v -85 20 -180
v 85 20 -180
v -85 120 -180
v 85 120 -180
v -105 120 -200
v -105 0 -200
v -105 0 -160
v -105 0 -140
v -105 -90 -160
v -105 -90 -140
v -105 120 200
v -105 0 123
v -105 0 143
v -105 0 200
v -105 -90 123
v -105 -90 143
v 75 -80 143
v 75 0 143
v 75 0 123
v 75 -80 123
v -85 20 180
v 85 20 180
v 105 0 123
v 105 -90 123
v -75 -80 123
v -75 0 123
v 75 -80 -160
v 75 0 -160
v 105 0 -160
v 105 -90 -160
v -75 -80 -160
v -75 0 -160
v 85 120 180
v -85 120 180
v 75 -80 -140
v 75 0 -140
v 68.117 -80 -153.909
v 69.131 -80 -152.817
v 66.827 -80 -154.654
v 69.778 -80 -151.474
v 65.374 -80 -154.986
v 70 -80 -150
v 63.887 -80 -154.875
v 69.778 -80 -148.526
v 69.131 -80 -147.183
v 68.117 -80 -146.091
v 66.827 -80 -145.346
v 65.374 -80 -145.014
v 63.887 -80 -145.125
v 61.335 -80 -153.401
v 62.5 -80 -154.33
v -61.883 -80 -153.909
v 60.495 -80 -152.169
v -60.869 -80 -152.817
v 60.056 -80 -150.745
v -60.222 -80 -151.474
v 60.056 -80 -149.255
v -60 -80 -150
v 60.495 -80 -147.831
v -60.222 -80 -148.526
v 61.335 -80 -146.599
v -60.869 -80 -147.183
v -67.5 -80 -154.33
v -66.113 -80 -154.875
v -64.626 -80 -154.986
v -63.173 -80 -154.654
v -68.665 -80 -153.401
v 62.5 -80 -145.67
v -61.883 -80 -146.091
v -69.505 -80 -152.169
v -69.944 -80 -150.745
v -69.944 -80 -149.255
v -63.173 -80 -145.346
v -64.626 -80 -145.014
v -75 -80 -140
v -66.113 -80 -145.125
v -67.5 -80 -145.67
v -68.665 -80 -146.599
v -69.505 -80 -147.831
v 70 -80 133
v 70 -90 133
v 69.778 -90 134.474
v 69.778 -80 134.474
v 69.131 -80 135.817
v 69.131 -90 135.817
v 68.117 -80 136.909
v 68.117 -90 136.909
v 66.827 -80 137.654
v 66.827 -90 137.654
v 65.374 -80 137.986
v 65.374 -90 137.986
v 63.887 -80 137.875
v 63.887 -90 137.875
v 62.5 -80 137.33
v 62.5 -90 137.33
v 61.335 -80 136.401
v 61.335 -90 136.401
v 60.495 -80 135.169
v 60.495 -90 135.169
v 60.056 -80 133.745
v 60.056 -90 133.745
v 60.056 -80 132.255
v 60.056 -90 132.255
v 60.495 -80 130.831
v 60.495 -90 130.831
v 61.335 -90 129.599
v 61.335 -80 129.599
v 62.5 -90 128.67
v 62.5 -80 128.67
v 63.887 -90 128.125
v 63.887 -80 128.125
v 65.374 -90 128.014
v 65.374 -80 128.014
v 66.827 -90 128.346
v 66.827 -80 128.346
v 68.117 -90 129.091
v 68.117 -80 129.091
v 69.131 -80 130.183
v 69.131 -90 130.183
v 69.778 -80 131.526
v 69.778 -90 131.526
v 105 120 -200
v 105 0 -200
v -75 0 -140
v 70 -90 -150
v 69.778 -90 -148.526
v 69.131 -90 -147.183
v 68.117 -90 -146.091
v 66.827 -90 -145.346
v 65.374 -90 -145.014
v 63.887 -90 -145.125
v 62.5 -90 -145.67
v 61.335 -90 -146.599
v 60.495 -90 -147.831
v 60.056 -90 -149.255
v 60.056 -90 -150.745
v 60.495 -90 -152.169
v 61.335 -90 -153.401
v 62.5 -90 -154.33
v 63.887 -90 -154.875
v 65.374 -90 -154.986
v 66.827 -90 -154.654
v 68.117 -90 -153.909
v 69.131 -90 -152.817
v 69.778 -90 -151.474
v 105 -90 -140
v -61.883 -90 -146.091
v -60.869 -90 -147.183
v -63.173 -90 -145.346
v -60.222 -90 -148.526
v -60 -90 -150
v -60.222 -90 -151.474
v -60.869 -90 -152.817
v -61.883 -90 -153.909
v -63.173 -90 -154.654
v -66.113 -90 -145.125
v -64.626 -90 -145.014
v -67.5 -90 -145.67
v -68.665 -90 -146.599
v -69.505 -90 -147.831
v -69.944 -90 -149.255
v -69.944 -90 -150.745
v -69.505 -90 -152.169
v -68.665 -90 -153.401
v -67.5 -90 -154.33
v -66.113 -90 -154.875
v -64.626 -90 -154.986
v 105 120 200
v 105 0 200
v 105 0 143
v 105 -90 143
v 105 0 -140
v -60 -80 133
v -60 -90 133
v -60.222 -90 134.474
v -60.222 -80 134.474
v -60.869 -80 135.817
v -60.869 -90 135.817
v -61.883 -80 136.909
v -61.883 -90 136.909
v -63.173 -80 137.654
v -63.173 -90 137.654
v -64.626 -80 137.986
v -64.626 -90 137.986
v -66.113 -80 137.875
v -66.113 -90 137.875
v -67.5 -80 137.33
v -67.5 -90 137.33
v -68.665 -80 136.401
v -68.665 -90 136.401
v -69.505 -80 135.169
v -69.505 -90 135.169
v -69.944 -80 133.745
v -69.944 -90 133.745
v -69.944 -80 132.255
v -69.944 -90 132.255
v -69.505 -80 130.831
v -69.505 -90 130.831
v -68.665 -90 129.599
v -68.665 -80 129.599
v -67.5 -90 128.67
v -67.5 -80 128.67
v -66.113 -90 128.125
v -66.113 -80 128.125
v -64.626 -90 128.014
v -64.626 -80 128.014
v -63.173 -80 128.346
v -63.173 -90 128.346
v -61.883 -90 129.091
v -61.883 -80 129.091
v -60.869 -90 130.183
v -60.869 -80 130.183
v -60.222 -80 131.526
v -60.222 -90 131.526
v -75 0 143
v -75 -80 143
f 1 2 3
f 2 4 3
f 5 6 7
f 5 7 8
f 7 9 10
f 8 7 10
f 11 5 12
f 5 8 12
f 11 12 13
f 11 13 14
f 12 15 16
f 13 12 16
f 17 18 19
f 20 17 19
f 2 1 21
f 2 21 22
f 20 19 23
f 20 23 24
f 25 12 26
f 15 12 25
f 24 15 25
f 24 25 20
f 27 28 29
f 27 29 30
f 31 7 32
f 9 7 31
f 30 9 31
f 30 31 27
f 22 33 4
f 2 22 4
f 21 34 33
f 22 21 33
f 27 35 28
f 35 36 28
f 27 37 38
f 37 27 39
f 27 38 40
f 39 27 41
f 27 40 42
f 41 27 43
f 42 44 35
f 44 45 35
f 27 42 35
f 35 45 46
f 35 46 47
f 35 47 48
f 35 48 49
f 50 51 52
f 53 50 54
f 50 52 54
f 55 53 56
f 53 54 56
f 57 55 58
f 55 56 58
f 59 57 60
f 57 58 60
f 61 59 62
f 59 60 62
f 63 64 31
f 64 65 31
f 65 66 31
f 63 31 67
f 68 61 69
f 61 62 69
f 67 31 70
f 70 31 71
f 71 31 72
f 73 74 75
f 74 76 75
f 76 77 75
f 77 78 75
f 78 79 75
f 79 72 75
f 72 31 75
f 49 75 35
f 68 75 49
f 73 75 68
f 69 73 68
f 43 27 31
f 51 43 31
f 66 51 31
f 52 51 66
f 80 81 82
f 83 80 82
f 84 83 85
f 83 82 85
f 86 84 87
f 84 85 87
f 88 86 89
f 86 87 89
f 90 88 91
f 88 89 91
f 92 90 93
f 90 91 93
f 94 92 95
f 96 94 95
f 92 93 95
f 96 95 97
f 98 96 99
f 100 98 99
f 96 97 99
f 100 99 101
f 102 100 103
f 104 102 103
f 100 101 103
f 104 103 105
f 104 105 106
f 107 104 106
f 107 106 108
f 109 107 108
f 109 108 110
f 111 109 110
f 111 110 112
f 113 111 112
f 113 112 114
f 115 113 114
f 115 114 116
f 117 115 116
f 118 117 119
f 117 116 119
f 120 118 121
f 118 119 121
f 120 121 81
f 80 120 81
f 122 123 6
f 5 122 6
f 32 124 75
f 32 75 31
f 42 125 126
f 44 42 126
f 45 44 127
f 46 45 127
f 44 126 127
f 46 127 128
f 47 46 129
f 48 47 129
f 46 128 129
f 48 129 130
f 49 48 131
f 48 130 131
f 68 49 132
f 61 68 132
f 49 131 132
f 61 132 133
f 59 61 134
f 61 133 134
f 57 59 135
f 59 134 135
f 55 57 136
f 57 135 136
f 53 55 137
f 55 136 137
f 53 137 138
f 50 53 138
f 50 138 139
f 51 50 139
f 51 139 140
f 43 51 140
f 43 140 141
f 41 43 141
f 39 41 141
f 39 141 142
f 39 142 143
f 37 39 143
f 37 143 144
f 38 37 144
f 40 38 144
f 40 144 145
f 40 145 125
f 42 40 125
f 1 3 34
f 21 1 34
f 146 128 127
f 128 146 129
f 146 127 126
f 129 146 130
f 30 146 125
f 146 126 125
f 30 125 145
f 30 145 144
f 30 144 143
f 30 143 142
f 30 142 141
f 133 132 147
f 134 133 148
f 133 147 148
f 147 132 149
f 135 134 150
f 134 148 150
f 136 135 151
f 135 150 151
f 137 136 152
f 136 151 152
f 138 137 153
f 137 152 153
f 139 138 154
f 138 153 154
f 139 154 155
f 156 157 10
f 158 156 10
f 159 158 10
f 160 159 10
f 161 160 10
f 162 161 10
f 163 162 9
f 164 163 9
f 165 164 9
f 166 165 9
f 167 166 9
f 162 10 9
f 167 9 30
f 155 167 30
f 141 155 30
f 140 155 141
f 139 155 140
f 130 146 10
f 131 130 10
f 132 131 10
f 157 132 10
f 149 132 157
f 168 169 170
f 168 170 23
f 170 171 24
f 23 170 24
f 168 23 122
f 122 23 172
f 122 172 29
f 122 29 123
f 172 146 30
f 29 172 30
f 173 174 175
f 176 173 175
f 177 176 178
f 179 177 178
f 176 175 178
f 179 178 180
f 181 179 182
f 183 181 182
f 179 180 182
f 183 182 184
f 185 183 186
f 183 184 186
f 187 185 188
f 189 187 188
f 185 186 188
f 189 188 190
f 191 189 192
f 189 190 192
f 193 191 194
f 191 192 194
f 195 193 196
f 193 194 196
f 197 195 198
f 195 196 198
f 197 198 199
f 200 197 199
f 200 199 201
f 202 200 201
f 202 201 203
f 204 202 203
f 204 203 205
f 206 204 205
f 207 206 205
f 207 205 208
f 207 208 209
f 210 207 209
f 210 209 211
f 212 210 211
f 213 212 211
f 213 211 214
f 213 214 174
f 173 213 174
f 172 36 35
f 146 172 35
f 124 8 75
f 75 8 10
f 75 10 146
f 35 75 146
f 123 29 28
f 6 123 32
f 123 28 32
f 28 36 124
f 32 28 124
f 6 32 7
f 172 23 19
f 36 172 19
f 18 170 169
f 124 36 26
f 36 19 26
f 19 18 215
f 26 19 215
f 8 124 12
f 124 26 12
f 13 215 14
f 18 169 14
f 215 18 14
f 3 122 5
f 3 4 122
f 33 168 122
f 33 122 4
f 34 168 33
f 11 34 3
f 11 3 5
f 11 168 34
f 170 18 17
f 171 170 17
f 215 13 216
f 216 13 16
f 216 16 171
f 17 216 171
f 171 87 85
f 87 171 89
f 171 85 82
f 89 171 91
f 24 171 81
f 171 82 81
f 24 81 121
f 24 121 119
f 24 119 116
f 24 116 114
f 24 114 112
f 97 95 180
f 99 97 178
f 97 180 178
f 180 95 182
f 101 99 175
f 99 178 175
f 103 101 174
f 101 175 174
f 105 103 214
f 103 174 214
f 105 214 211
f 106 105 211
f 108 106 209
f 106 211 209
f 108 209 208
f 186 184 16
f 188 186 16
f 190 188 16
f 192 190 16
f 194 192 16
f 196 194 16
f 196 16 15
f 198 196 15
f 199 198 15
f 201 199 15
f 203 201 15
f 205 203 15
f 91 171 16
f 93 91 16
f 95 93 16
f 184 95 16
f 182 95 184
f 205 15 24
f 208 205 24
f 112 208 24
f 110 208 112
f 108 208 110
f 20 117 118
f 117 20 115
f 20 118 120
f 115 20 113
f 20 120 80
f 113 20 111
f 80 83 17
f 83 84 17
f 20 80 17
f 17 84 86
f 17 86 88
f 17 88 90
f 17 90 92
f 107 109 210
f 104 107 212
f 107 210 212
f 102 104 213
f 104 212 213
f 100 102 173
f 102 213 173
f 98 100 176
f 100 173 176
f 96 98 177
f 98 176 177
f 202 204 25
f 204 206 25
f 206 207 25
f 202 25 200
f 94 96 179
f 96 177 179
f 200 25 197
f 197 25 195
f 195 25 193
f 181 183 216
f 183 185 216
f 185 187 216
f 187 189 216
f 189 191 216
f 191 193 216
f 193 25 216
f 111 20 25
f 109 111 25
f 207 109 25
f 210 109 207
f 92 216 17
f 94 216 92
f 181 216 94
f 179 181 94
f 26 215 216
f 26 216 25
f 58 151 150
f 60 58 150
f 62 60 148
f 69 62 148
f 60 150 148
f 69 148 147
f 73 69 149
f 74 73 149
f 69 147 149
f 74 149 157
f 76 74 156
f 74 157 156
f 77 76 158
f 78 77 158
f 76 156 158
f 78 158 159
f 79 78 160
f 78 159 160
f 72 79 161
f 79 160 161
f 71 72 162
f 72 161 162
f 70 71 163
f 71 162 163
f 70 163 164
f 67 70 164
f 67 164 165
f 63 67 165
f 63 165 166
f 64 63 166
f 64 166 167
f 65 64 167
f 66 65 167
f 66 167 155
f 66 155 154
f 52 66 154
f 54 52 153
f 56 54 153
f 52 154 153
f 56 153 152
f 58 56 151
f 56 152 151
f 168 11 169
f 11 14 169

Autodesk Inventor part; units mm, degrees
ref_plane "YZ Plane" through (0, 0, 0) normal (1, 0, 0) x (0, 1, 0)
ref_plane "XZ Plane" through (0, 0, 0) normal (0, 1, 0) x (-1, 0, 0)
ref_plane "XY Plane" through (0, 0, 0) normal (0, 0, 1) x (1, 0, 0)
sketch "Boceto1" plane through (0, 0, 0) normal (0, 1, 0) x (-1, 0, 0)
  line L0 (105, 200) -> (-105, 200)
  line L1 (-105, 200) -> (-105, -200)
  line L2 (-105, -200) -> (105, -200)
  line L3 (105, -200) -> (105, 200)
  line L4 (105, 200) -> (-105, -200) construction
  line L5 (-105, 200) -> (105, -200) construction
  point P0 (0, 0)
  dimension "d0" = 210
  dimension "d1" = 400
extrude "Extrusión1" add sketch "Boceto1" along normal blind 120
sketch "Boceto2" plane through (0, 120, 0) normal (0, 1, 0) x (1, 0, 0)
  line L0 (-85, -180) -> (85, -180)
  line L1 (85, -180) -> (85, 180)
  line L2 (85, 180) -> (-85, 180)
  line L3 (-85, 180) -> (-85, -180)
  line L4 (-85, -180) -> (85, 180) construction
  line L5 (85, -180) -> (-85, 180) construction
  point P0 (0, 0)
  dimension "d4" = 170
  dimension "d5" = 360
extrude "Extrusión2" cut sketch "Boceto2" against normal blind 100
sketch "Boceto3" plane through (0, 0, 0) normal (0, -1, 0) x (1, 0, 0)
  line L0 (105, 143) -> (75, 143)
  line L1 (75, 143) -> (75, 123)
  line L2 (75, 123) -> (105, 123)
  line L3 (105, 123) -> (105, 143)
  line L4 (105, 143) -> (75, 123) construction
  line L5 (75, 143) -> (105, 123) construction
  line L6 (105, -140) -> (75, -140)
  line L7 (75, -140) -> (75, -160)
  line L8 (75, -160) -> (105, -160)
  line L9 (105, -160) -> (105, -140)
  line L10 (105, -140) -> (75, -160) construction
  line L11 (75, -140) -> (105, -160) construction
  line L12 (105, -200) -> (-105, -200) projected
  line L13 (-105, 143) -> (-75, 143)
  line L14 (-75, 143) -> (-75, 123)
  line L15 (-75, 123) -> (-105, 123)
  line L16 (-105, 123) -> (-105, 143)
  line L17 (-105, 143) -> (-75, 123) construction
  line L18 (-75, 143) -> (-105, 123) construction
  line L19 (-105, -140) -> (-75, -140)
  line L20 (-75, -140) -> (-75, -160)
  line L21 (-75, -160) -> (-105, -160)
  line L22 (-105, -160) -> (-105, -140)
  line L23 (-105, -140) -> (-75, -160) construction
  line L24 (-75, -140) -> (-105, -160) construction
  line L25 (-105, 200) -> (105, 200) projected
  point P0 (0, 0)
  point P1 (90, 133)
  point P2 (105, 133)
  point P3 (90, -150)
  point P4 (105, -150)
  point P5 (-90, 35)
  point P6 (-105, 35)
  point P7 (-90, -150)
  point P8 (-105, -150)
  point P9 (-90, 143)
  dimension "d9" = 20
  dimension "d12" = 20
  dimension "d34" = 57
  dimension "d35" = 57
  dimension "d36" = 20
  dimension "d37" = 40
  dimension "d38" = 40
extrude "Extrusión3" add sketch "Boceto3" along normal blind 90
sketch "Boceto6" plane through (-75, 0, 143) normal (1, 0, 0) x (0, 0, -1)
  line L0 (0, 0) -> (0, -90) projected
  line L1 (20, 0) -> (20, -90) projected
  line L2 (0, -90) -> (20, -90)
  line L3 (20, -90) -> (20, -80)
  line L4 (20, -80) -> (0, -80)
  line L5 (0, -80) -> (0, -90)
  point P0 (143, 0)
  dimension "d16" = 10
extrude "Extrusión4" add sketch "Boceto6" along normal blind 150
sketch "Boceto7" plane through (-75, 0, -140) normal (1, 0, 0) x (0, 0, -1)
  line L0 (0, 0) -> (0, -90) projected
  line L1 (20, 0) -> (20, -90) projected
  line L2 (0, -90) -> (20, -90)
  line L3 (20, -90) -> (20, -80)
  line L4 (20, -80) -> (0, -80)
  line L5 (0, -80) -> (0, -90)
  point P0 (-140, 0)
  dimension "d19" = 10
extrude "Extrusión5" add sketch "Boceto7" along normal blind 150
sketch "Boceto8" plane through (0, -90, 0) normal (0, -1, 0) x (1, 0, 0)
  circle A0 centre (-65, 133) radius 5
  circle A1 centre (65, 133) radius 5
  line L0 (-105, 143) -> (-105, 123) projected
  line L1 (105, 123) -> (105, 143) projected
  line L2 (60, 123) -> (60, 143)
  line L3 (105, 143) -> (-105, 143) projected
  point P0 (0, 0)
  dimension "d22" = 10
  dimension "d23" = 10
  dimension "d24" = 40
  dimension "d25" = 40
  dimension "d39" = 10
  dimension "d40" = 10
sketch "Boceto9" plane through (0, -90, 0) normal (0, -1, 0) x (1, 0, 0)
  circle A0 centre (-65, -150) radius 5
  circle A1 centre (65, -150) radius 5
  line L0 (-105, -140) -> (-105, -160) projected
  line L1 (105, -160) -> (105, -140) projected
  point P0 (0, 0)
  dimension "d26" = 10
  dimension "d27" = 10
  dimension "d28" = 40
  dimension "d29" = 40
extrude "Extrusión6" cut sketch "Boceto8" against normal blind 20
extrude "Extrusión7" cut sketch "Boceto9" against normal blind 20
properties part number "container"
